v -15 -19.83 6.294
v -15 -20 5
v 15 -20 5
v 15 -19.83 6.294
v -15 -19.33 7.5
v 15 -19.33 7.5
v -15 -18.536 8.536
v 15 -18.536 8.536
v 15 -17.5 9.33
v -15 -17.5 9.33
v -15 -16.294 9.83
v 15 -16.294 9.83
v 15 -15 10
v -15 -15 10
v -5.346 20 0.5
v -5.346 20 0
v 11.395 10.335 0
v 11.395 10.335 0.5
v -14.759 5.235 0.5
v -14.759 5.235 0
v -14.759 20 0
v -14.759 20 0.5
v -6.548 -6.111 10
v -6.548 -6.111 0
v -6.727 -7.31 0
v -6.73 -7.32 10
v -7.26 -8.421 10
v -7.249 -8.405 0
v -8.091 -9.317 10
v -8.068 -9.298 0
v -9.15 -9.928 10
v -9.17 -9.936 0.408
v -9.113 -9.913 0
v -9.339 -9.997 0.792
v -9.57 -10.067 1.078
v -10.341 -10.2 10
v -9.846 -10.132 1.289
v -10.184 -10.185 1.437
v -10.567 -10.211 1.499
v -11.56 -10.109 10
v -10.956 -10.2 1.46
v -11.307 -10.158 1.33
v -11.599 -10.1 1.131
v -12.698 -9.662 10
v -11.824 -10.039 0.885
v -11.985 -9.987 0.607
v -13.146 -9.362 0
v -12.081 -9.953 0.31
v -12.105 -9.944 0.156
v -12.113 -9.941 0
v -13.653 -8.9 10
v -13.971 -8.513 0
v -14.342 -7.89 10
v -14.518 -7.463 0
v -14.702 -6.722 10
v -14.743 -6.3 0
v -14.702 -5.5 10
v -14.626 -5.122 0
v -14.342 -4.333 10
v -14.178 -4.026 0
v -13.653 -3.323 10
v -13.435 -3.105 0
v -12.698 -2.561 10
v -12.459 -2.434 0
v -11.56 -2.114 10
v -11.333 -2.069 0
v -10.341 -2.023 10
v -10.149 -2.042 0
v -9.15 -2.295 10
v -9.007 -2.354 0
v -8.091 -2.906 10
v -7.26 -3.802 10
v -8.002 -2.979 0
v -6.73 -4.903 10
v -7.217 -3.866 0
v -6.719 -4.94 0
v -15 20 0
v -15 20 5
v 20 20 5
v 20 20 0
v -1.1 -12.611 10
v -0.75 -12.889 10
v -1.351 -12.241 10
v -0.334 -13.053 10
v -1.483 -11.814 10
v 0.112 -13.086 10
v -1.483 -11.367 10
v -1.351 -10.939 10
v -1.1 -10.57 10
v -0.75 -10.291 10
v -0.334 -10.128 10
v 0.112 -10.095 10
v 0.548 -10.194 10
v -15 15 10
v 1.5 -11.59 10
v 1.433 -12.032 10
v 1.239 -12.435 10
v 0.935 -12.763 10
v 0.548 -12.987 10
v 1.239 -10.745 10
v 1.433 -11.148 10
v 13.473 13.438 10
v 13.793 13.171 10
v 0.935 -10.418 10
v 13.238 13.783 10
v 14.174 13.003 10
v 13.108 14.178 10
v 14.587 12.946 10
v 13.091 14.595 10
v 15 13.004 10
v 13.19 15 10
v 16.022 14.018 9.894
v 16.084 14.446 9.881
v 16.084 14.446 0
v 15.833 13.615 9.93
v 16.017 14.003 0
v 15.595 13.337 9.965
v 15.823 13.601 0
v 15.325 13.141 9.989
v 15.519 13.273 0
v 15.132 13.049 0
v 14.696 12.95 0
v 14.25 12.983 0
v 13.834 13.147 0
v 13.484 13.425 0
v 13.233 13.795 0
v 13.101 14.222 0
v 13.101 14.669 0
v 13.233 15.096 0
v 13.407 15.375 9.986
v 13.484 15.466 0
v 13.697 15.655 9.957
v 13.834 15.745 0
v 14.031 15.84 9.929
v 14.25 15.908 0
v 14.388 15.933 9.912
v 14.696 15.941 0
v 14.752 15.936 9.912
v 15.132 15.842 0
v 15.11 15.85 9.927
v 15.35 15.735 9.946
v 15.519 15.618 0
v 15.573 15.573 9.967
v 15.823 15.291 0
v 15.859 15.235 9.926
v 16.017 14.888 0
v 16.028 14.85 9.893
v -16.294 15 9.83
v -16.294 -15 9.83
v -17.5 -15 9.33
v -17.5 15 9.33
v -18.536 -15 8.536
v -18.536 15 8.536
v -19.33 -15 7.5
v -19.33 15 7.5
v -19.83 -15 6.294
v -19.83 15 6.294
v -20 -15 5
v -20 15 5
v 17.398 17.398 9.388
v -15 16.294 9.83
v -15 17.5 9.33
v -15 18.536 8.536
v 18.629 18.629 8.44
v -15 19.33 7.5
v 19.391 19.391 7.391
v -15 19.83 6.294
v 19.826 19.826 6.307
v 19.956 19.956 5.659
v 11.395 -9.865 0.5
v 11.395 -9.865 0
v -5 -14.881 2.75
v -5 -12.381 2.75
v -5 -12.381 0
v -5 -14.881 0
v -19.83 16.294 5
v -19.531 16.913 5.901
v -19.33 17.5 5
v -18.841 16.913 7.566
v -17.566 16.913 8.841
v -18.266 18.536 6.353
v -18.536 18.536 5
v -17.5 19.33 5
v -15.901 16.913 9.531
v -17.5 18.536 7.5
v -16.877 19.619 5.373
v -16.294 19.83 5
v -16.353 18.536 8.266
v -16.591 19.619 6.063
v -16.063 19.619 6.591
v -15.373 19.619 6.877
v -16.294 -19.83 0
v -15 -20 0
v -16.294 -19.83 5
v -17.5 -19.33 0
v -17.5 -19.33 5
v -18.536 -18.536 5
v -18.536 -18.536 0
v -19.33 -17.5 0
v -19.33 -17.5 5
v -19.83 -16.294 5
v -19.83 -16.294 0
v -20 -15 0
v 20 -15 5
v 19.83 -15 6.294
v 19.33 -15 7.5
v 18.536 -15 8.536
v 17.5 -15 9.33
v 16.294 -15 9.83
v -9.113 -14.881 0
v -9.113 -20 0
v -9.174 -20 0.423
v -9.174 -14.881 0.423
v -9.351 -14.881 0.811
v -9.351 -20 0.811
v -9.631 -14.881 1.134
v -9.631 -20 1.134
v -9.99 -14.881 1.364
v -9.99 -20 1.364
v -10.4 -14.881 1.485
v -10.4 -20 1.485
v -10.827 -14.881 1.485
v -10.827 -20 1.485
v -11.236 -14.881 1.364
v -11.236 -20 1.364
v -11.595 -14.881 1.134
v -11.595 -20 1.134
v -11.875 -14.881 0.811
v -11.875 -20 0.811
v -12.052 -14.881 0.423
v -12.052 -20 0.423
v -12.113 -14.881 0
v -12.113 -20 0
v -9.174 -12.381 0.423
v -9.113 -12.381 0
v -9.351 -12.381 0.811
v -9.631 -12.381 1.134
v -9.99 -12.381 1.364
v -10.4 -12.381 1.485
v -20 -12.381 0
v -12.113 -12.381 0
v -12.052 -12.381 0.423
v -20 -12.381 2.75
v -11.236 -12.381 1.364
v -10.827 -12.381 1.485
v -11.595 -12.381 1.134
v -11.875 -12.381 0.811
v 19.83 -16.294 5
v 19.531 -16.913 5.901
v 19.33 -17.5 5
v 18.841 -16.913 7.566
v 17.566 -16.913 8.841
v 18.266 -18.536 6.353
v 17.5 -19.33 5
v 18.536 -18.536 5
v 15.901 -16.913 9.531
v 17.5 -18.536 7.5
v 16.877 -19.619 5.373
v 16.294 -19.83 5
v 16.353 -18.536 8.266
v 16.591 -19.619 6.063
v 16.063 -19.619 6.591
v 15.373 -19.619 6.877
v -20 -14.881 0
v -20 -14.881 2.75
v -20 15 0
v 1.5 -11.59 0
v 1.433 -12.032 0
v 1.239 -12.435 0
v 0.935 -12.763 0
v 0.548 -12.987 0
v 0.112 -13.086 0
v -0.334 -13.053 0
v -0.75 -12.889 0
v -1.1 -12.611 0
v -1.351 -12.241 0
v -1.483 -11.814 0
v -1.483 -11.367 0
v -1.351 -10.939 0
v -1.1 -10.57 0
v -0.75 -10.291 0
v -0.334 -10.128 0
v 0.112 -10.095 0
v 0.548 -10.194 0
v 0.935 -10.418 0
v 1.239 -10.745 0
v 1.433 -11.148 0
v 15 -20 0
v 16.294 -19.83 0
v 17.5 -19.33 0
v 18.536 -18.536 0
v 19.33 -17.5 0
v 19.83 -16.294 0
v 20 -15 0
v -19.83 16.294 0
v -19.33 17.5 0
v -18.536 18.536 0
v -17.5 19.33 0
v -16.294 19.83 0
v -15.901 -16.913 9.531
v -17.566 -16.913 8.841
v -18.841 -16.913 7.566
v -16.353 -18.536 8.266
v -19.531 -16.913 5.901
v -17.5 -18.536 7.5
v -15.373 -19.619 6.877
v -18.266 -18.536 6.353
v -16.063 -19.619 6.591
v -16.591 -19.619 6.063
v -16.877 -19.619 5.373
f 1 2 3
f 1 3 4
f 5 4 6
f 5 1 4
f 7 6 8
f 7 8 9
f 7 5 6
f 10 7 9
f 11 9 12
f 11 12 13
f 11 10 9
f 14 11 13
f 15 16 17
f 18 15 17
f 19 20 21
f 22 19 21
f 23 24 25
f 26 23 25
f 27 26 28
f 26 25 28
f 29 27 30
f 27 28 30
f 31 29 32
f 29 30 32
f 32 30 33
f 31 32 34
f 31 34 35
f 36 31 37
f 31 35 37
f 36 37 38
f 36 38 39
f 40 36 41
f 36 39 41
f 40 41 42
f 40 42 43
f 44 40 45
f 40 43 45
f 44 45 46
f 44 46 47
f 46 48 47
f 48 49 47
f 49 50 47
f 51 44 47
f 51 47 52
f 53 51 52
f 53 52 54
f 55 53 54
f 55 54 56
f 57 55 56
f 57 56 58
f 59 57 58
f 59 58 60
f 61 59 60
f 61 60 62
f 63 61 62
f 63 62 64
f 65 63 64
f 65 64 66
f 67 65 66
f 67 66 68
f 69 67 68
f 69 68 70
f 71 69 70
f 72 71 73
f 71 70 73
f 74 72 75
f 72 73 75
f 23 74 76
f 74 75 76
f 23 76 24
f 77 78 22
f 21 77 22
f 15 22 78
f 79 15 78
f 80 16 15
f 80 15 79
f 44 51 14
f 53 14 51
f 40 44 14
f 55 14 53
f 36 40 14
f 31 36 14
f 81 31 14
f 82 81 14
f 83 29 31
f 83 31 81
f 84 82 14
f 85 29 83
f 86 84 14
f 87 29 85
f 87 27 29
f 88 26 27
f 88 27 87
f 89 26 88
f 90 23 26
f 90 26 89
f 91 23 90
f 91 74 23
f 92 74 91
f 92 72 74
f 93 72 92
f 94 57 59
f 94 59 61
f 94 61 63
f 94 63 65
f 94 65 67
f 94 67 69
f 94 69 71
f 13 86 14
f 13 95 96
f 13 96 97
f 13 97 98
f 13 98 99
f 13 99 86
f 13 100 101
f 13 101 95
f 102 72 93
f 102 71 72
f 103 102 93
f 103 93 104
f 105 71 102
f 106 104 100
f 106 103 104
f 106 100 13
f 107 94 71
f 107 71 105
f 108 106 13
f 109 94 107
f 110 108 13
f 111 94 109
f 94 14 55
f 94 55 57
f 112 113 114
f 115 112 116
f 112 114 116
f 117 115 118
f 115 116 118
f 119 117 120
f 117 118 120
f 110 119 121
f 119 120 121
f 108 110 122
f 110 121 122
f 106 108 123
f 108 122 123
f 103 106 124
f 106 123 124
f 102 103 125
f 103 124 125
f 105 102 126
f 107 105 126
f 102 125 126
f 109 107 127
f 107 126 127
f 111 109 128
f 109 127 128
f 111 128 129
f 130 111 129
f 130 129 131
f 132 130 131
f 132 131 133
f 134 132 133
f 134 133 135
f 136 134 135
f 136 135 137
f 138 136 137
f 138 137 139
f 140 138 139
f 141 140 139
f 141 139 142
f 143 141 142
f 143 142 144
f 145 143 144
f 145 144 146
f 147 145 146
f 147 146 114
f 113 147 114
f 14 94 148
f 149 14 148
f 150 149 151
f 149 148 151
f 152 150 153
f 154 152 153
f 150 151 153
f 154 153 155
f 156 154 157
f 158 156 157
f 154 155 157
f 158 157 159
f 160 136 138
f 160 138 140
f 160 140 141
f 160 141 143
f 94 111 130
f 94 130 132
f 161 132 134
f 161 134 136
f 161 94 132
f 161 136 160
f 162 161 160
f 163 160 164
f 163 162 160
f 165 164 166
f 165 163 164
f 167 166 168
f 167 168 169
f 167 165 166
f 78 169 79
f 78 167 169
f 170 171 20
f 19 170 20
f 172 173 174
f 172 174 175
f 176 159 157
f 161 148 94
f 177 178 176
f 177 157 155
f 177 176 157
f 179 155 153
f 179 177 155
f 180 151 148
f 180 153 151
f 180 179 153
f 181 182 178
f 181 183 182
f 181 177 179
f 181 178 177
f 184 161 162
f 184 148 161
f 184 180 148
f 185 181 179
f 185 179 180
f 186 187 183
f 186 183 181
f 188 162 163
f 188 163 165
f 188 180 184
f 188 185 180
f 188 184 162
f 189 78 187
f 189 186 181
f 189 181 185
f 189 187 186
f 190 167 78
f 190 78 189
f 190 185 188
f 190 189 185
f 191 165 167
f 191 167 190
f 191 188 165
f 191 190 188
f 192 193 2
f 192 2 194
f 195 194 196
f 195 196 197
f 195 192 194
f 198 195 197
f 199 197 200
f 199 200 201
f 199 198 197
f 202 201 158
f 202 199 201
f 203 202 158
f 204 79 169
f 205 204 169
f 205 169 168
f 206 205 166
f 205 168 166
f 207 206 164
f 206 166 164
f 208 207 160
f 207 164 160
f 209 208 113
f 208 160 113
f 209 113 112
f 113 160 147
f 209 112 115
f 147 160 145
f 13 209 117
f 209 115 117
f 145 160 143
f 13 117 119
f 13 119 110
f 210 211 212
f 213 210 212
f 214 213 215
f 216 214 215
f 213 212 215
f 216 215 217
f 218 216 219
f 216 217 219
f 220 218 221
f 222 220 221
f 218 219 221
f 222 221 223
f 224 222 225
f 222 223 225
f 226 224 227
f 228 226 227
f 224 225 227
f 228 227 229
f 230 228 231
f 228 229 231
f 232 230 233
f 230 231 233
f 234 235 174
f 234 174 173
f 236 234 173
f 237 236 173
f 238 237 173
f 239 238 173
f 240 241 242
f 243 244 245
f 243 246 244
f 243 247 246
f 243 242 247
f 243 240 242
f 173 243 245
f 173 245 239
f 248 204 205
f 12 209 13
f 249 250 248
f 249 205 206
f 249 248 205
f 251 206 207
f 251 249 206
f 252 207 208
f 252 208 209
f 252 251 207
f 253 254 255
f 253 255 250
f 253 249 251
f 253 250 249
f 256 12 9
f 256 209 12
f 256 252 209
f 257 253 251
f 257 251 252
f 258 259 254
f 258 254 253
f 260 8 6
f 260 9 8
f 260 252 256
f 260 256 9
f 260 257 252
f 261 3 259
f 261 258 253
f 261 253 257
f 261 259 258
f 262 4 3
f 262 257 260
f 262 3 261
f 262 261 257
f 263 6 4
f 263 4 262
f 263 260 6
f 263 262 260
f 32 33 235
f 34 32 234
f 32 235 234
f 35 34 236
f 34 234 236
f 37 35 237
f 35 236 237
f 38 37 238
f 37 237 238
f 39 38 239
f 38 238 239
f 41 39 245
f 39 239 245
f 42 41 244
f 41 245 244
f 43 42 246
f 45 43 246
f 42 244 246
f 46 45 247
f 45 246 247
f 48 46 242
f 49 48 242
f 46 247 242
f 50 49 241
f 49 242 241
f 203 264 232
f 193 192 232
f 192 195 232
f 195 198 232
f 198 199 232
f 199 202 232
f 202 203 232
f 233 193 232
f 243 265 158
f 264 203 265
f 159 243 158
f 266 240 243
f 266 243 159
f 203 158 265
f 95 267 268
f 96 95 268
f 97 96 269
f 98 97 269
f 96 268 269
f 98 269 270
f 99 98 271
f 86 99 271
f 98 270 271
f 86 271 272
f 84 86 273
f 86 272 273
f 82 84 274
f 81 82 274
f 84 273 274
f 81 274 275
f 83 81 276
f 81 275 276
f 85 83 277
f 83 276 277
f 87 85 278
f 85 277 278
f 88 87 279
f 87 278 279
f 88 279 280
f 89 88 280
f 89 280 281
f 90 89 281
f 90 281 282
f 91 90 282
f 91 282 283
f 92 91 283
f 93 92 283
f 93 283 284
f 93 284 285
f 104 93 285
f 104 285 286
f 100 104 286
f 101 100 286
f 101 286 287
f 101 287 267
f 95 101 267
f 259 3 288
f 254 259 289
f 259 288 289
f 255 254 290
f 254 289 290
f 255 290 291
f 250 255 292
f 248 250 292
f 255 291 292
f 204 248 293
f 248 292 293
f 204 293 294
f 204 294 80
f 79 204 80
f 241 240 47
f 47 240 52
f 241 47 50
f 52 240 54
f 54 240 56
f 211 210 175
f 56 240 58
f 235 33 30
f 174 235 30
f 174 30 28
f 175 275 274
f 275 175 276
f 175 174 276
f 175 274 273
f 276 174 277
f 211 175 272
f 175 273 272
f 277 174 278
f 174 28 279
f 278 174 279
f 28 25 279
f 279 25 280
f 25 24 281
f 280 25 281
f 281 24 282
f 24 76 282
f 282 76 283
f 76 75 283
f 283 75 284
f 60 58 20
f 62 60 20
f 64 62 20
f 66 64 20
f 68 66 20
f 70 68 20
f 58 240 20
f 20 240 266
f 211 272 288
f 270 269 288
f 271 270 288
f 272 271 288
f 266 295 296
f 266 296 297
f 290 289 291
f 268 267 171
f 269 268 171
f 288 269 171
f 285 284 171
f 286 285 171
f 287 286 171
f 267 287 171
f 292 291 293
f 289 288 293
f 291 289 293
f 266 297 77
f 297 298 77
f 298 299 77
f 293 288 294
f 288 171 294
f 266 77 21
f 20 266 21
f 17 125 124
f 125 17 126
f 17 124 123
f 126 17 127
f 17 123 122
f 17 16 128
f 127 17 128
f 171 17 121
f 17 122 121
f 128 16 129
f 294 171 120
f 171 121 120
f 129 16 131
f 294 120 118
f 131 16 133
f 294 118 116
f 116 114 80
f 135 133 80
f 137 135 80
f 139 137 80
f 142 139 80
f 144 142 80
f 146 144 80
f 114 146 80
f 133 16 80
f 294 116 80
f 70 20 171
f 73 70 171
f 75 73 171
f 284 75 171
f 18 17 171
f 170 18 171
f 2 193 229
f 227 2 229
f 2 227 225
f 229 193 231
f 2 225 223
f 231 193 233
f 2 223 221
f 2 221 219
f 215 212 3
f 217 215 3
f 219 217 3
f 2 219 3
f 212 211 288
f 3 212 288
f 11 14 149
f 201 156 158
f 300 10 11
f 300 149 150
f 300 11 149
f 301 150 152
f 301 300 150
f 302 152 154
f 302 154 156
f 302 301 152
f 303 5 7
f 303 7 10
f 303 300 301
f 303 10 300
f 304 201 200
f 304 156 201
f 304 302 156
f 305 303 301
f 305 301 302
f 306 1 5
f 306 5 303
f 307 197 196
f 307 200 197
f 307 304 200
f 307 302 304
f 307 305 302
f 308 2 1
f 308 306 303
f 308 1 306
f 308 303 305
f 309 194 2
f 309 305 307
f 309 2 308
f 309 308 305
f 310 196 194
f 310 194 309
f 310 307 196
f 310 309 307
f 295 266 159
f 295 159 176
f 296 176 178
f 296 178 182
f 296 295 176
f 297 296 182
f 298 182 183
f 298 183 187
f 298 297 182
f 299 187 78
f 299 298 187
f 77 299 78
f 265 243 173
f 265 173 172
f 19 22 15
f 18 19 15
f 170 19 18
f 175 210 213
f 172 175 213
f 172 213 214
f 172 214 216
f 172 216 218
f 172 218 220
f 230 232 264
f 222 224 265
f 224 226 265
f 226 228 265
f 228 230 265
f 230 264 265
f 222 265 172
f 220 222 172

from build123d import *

# Parameters (mm, degrees)
F0_W          = 40
F0_H          = 40
F1_DEPTH      = 10
F3_DEPTH      = 0.5
F4_R          = 4.1
F5_DEPTH      = 10.001
F7_W          = 2.5
F7_H          = 2.75
F8_DEPTH      = 15
F11_REACH     = 43.3551019662
F12_R         = 1.5
F13_DEPTH     = 10.0010001
F14_T1_DEPTH  = 17.5
F14_T3_DEPTH  = 47.5
F14_T5_DEPTH  = 30
F14_T7_DEPTH  = 30
F14_T9_DEPTH  = 47.5
F14_S13_W     = 5
F14_S13_H     = 5
F14_T14_DEPTH = 5
F14_S19_W     = 5
F14_S19_H     = 5
F14_T20_DEPTH = 5
F14_S25_W     = 5
F14_S25_H     = 5
F14_T26_DEPTH = 5


# Not quite as in the source:
# - a fillet or chamfer that OpenCascade refuses, or shapes differently, is made with other operations: its cross-section is extruded or revolved along the edge and cut away or added


with BuildPart() as f1:
    # F0 (on Top) → F1 (new body)
    with BuildSketch(Plane.XY):
        Rectangle(F0_W, F0_H)
    extrude(amount=F1_DEPTH)

    # F2 (on face) → F3 (cut)
    with BuildSketch(Plane(origin=(0, 0, 0), x_dir=(1, 0, 0), z_dir=(0, 0, -1))):
        Polygon((11.3946354911, 9.8654455945), (-14.7593317032, -5.2345544055), (-14.7593317032, -20), (-5.3464073564, -20), (11.3946354911, -10.3345544055), align=None)
    extrude(amount=-F3_DEPTH, mode=Mode.SUBTRACT)

    # F4 (on face) → F5 (cut, through all)
    with BuildSketch(Plane(origin=(0, 0, 0), x_dir=(1, 0, 0), z_dir=(0, 0, -1))):
        with Locations((-10.6475949287, 6.1114258133)):
            Circle(F4_R)
    extrude(amount=-F5_DEPTH, mode=Mode.SUBTRACT)

    # F7 (on face) → F8 (cut)
    with BuildSketch(Plane(origin=(-20, 0, 0), x_dir=(0, -1, 0), z_dir=(-1, 0, 0))):
        with Locations((13.6307496577, 1.375)):
            Rectangle(F7_W, F7_H)
    extrude(amount=-F8_DEPTH, mode=Mode.SUBTRACT)

    f11_end = f1.faces().sort_by_distance((-14.7475949287, -6.1114258133, 5))[0]
    # F10 (on face) → F11 (cut, up to a face of the model that its end follows)
    with BuildSketch(Plane.XZ.offset(20)):
        with BuildLine():
            Line((-12.1130503118, 0), (-9.1130503118, 0))
            ThreePointArc((-9.1130503118, 0), (-10.6130503118, 1.5), (-12.1130503118, 0))
        make_face()
    f11_long = extrude(amount=-F11_REACH, mode=Mode.PRIVATE)
    add(split(f11_long, bisect_by=f11_end, keep=Keep.ALL, mode=Mode.PRIVATE).solids().sort_by_distance((-10.6130503118, -20, 0.6366197724))[0], mode=Mode.SUBTRACT)

    # F12 (on face) → F13 (cut, through all)
    with BuildSketch(Plane(origin=(0, 0, 0), x_dir=(1, 0, 0), z_dir=(0, 0, -1))):
        with Locations((0, 11.5903077688)):
            Circle(F12_R)
        with Locations((14.5839625479, -14.4456071497)):
            Circle(F12_R)
    extrude(amount=-F13_DEPTH, mode=Mode.SUBTRACT)

    # F14: fillet of radius 5 on 7 edges, made by hand

    # F14_s2 → F14_t1 (cut)
    with BuildSketch(Plane.XY.offset(-12.5)):
        with BuildLine():
            ThreePointArc((-15, -20), (-18.5355339059, -18.5355339059), (-20, -15))
            Line((-20, -15), (-20, -20))
            Line((-20, -20), (-15, -20))
        make_face()
        with BuildLine():
            ThreePointArc((-20, 15), (-18.5355339059, 18.5355339059), (-15, 20))
            Line((-15, 20), (-20, 20))
            Line((-20, 20), (-20, 15))
        make_face()
        with BuildLine():
            ThreePointArc((15, -20), (18.5355339059, -18.5355339059), (20, -15))
            Line((20, -15), (20, -20))
            Line((20, -20), (15, -20))
        make_face()
    extrude(amount=F14_T1_DEPTH, mode=Mode.SUBTRACT)

    # F14_s4 → F14_t3 (cut)
    with BuildSketch(Plane.XZ.offset(-32.5)):
        with BuildLine():
            ThreePointArc((20, 5), (18.5355339059, 8.5355339059), (15, 10))
            Line((15, 10), (20, 10))
            Line((20, 10), (20, 5))
        make_face()
    extrude(amount=F14_T3_DEPTH, mode=Mode.SUBTRACT)

    # F14_s6 → F14_t5 (cut)
    with BuildSketch(Plane.YZ.offset(-15)):
        with BuildLine():
            ThreePointArc((-20, 5), (-18.5355339059, 8.5355339059), (-15, 10))
            Line((-15, 10), (-20, 10))
            Line((-20, 10), (-20, 5))
        make_face()
    extrude(amount=F14_T5_DEPTH, mode=Mode.SUBTRACT)

    # F14_s8 → F14_t7 (cut)
    with BuildSketch(Plane.XZ.offset(-15)):
        with BuildLine():
            ThreePointArc((-15, 10), (-18.5355339059, 8.5355339059), (-20, 5))
            Line((-20, 5), (-20, 10))
            Line((-20, 10), (-15, 10))
        make_face()
    extrude(amount=F14_T7_DEPTH, mode=Mode.SUBTRACT)

    # F14_s10 → F14_t9 (cut)
    with BuildSketch(Plane.YZ.offset(-15)):
        with BuildLine():
            ThreePointArc((15, 10), (18.5355339059, 8.5355339059), (20, 5))
            Line((20, 5), (20, 10))
            Line((20, 10), (15, 10))
        make_face()
    extrude(amount=F14_T9_DEPTH, mode=Mode.SUBTRACT)


with BuildPart() as f14_tool12:
    # F14_s13 → F14_t14 (new body)
    with BuildSketch(Plane.XZ.offset(15)):
        with Locations((-17.5, 7.5)):
            Rectangle(F14_S13_W, F14_S13_H)
    extrude(amount=F14_T14_DEPTH)

    # F14_s15 → F14_t16 (revolve, cut)
    with BuildSketch(Plane(origin=(-15, -15, 5), x_dir=(0.7071067812, 0, -0.7071067812), z_dir=(-0.7071067812, 0, -0.7071067812))):
        with BuildLine():
            ThreePointArc((0, -5), (5, 0), (0, 5))
            Line((0, 5), (0, -5))
        make_face()
    revolve(axis=Axis((-15, -15, 5), (0, -1, 0)), mode=Mode.SUBTRACT)


with BuildPart() as f1_1:
    add(f1.part)

    # F14_t11: cut F14_tool12
    add(f14_tool12.part, mode=Mode.SUBTRACT)


with BuildPart() as f14_tool18:
    # F14_s19 → F14_t20 (new body)
    with BuildSketch(Plane.XZ.offset(-15)):
        with Locations((-17.5, 7.5)):
            Rectangle(F14_S19_W, F14_S19_H)
    extrude(amount=-F14_T20_DEPTH)

    # F14_s21 → F14_t22 (revolve, cut)
    with BuildSketch(Plane(origin=(-15, 15, 5), x_dir=(0.7071067812, 0, -0.7071067812), z_dir=(0.7071067812, 0, 0.7071067812))):
        with BuildLine():
            ThreePointArc((0, -5), (5, 0), (0, 5))
            Line((0, 5), (0, -5))
        make_face()
    revolve(axis=Axis((-15, 15, 5), (0, 1, 0)), mode=Mode.SUBTRACT)


with BuildPart() as f1_2:
    add(f1_1.part)

    # F14_t17: cut F14_tool18
    add(f14_tool18.part, mode=Mode.SUBTRACT)


with BuildPart() as f14_tool24:
    # F14_s25 → F14_t26 (new body)
    with BuildSketch(Plane.XZ.offset(15)):
        with Locations((17.5, 7.5)):
            Rectangle(F14_S25_W, F14_S25_H)
    extrude(amount=F14_T26_DEPTH)

    # F14_s27 → F14_t28 (revolve, cut)
    with BuildSketch(Plane(origin=(15, -15, 5), x_dir=(-0.7071067812, 0, -0.7071067812), z_dir=(-0.7071067812, 0, 0.7071067812))):
        with BuildLine():
            ThreePointArc((0, -5), (5, 0), (0, 5))
            Line((0, 5), (0, -5))
        make_face()
    revolve(axis=Axis((15, -15, 5), (0, -1, 0)), mode=Mode.SUBTRACT)


with BuildPart() as f1_3:
    add(f1_2.part)

    # F14_t23: cut F14_tool24
    add(f14_tool24.part, mode=Mode.SUBTRACT)


solid = f1_3.part
